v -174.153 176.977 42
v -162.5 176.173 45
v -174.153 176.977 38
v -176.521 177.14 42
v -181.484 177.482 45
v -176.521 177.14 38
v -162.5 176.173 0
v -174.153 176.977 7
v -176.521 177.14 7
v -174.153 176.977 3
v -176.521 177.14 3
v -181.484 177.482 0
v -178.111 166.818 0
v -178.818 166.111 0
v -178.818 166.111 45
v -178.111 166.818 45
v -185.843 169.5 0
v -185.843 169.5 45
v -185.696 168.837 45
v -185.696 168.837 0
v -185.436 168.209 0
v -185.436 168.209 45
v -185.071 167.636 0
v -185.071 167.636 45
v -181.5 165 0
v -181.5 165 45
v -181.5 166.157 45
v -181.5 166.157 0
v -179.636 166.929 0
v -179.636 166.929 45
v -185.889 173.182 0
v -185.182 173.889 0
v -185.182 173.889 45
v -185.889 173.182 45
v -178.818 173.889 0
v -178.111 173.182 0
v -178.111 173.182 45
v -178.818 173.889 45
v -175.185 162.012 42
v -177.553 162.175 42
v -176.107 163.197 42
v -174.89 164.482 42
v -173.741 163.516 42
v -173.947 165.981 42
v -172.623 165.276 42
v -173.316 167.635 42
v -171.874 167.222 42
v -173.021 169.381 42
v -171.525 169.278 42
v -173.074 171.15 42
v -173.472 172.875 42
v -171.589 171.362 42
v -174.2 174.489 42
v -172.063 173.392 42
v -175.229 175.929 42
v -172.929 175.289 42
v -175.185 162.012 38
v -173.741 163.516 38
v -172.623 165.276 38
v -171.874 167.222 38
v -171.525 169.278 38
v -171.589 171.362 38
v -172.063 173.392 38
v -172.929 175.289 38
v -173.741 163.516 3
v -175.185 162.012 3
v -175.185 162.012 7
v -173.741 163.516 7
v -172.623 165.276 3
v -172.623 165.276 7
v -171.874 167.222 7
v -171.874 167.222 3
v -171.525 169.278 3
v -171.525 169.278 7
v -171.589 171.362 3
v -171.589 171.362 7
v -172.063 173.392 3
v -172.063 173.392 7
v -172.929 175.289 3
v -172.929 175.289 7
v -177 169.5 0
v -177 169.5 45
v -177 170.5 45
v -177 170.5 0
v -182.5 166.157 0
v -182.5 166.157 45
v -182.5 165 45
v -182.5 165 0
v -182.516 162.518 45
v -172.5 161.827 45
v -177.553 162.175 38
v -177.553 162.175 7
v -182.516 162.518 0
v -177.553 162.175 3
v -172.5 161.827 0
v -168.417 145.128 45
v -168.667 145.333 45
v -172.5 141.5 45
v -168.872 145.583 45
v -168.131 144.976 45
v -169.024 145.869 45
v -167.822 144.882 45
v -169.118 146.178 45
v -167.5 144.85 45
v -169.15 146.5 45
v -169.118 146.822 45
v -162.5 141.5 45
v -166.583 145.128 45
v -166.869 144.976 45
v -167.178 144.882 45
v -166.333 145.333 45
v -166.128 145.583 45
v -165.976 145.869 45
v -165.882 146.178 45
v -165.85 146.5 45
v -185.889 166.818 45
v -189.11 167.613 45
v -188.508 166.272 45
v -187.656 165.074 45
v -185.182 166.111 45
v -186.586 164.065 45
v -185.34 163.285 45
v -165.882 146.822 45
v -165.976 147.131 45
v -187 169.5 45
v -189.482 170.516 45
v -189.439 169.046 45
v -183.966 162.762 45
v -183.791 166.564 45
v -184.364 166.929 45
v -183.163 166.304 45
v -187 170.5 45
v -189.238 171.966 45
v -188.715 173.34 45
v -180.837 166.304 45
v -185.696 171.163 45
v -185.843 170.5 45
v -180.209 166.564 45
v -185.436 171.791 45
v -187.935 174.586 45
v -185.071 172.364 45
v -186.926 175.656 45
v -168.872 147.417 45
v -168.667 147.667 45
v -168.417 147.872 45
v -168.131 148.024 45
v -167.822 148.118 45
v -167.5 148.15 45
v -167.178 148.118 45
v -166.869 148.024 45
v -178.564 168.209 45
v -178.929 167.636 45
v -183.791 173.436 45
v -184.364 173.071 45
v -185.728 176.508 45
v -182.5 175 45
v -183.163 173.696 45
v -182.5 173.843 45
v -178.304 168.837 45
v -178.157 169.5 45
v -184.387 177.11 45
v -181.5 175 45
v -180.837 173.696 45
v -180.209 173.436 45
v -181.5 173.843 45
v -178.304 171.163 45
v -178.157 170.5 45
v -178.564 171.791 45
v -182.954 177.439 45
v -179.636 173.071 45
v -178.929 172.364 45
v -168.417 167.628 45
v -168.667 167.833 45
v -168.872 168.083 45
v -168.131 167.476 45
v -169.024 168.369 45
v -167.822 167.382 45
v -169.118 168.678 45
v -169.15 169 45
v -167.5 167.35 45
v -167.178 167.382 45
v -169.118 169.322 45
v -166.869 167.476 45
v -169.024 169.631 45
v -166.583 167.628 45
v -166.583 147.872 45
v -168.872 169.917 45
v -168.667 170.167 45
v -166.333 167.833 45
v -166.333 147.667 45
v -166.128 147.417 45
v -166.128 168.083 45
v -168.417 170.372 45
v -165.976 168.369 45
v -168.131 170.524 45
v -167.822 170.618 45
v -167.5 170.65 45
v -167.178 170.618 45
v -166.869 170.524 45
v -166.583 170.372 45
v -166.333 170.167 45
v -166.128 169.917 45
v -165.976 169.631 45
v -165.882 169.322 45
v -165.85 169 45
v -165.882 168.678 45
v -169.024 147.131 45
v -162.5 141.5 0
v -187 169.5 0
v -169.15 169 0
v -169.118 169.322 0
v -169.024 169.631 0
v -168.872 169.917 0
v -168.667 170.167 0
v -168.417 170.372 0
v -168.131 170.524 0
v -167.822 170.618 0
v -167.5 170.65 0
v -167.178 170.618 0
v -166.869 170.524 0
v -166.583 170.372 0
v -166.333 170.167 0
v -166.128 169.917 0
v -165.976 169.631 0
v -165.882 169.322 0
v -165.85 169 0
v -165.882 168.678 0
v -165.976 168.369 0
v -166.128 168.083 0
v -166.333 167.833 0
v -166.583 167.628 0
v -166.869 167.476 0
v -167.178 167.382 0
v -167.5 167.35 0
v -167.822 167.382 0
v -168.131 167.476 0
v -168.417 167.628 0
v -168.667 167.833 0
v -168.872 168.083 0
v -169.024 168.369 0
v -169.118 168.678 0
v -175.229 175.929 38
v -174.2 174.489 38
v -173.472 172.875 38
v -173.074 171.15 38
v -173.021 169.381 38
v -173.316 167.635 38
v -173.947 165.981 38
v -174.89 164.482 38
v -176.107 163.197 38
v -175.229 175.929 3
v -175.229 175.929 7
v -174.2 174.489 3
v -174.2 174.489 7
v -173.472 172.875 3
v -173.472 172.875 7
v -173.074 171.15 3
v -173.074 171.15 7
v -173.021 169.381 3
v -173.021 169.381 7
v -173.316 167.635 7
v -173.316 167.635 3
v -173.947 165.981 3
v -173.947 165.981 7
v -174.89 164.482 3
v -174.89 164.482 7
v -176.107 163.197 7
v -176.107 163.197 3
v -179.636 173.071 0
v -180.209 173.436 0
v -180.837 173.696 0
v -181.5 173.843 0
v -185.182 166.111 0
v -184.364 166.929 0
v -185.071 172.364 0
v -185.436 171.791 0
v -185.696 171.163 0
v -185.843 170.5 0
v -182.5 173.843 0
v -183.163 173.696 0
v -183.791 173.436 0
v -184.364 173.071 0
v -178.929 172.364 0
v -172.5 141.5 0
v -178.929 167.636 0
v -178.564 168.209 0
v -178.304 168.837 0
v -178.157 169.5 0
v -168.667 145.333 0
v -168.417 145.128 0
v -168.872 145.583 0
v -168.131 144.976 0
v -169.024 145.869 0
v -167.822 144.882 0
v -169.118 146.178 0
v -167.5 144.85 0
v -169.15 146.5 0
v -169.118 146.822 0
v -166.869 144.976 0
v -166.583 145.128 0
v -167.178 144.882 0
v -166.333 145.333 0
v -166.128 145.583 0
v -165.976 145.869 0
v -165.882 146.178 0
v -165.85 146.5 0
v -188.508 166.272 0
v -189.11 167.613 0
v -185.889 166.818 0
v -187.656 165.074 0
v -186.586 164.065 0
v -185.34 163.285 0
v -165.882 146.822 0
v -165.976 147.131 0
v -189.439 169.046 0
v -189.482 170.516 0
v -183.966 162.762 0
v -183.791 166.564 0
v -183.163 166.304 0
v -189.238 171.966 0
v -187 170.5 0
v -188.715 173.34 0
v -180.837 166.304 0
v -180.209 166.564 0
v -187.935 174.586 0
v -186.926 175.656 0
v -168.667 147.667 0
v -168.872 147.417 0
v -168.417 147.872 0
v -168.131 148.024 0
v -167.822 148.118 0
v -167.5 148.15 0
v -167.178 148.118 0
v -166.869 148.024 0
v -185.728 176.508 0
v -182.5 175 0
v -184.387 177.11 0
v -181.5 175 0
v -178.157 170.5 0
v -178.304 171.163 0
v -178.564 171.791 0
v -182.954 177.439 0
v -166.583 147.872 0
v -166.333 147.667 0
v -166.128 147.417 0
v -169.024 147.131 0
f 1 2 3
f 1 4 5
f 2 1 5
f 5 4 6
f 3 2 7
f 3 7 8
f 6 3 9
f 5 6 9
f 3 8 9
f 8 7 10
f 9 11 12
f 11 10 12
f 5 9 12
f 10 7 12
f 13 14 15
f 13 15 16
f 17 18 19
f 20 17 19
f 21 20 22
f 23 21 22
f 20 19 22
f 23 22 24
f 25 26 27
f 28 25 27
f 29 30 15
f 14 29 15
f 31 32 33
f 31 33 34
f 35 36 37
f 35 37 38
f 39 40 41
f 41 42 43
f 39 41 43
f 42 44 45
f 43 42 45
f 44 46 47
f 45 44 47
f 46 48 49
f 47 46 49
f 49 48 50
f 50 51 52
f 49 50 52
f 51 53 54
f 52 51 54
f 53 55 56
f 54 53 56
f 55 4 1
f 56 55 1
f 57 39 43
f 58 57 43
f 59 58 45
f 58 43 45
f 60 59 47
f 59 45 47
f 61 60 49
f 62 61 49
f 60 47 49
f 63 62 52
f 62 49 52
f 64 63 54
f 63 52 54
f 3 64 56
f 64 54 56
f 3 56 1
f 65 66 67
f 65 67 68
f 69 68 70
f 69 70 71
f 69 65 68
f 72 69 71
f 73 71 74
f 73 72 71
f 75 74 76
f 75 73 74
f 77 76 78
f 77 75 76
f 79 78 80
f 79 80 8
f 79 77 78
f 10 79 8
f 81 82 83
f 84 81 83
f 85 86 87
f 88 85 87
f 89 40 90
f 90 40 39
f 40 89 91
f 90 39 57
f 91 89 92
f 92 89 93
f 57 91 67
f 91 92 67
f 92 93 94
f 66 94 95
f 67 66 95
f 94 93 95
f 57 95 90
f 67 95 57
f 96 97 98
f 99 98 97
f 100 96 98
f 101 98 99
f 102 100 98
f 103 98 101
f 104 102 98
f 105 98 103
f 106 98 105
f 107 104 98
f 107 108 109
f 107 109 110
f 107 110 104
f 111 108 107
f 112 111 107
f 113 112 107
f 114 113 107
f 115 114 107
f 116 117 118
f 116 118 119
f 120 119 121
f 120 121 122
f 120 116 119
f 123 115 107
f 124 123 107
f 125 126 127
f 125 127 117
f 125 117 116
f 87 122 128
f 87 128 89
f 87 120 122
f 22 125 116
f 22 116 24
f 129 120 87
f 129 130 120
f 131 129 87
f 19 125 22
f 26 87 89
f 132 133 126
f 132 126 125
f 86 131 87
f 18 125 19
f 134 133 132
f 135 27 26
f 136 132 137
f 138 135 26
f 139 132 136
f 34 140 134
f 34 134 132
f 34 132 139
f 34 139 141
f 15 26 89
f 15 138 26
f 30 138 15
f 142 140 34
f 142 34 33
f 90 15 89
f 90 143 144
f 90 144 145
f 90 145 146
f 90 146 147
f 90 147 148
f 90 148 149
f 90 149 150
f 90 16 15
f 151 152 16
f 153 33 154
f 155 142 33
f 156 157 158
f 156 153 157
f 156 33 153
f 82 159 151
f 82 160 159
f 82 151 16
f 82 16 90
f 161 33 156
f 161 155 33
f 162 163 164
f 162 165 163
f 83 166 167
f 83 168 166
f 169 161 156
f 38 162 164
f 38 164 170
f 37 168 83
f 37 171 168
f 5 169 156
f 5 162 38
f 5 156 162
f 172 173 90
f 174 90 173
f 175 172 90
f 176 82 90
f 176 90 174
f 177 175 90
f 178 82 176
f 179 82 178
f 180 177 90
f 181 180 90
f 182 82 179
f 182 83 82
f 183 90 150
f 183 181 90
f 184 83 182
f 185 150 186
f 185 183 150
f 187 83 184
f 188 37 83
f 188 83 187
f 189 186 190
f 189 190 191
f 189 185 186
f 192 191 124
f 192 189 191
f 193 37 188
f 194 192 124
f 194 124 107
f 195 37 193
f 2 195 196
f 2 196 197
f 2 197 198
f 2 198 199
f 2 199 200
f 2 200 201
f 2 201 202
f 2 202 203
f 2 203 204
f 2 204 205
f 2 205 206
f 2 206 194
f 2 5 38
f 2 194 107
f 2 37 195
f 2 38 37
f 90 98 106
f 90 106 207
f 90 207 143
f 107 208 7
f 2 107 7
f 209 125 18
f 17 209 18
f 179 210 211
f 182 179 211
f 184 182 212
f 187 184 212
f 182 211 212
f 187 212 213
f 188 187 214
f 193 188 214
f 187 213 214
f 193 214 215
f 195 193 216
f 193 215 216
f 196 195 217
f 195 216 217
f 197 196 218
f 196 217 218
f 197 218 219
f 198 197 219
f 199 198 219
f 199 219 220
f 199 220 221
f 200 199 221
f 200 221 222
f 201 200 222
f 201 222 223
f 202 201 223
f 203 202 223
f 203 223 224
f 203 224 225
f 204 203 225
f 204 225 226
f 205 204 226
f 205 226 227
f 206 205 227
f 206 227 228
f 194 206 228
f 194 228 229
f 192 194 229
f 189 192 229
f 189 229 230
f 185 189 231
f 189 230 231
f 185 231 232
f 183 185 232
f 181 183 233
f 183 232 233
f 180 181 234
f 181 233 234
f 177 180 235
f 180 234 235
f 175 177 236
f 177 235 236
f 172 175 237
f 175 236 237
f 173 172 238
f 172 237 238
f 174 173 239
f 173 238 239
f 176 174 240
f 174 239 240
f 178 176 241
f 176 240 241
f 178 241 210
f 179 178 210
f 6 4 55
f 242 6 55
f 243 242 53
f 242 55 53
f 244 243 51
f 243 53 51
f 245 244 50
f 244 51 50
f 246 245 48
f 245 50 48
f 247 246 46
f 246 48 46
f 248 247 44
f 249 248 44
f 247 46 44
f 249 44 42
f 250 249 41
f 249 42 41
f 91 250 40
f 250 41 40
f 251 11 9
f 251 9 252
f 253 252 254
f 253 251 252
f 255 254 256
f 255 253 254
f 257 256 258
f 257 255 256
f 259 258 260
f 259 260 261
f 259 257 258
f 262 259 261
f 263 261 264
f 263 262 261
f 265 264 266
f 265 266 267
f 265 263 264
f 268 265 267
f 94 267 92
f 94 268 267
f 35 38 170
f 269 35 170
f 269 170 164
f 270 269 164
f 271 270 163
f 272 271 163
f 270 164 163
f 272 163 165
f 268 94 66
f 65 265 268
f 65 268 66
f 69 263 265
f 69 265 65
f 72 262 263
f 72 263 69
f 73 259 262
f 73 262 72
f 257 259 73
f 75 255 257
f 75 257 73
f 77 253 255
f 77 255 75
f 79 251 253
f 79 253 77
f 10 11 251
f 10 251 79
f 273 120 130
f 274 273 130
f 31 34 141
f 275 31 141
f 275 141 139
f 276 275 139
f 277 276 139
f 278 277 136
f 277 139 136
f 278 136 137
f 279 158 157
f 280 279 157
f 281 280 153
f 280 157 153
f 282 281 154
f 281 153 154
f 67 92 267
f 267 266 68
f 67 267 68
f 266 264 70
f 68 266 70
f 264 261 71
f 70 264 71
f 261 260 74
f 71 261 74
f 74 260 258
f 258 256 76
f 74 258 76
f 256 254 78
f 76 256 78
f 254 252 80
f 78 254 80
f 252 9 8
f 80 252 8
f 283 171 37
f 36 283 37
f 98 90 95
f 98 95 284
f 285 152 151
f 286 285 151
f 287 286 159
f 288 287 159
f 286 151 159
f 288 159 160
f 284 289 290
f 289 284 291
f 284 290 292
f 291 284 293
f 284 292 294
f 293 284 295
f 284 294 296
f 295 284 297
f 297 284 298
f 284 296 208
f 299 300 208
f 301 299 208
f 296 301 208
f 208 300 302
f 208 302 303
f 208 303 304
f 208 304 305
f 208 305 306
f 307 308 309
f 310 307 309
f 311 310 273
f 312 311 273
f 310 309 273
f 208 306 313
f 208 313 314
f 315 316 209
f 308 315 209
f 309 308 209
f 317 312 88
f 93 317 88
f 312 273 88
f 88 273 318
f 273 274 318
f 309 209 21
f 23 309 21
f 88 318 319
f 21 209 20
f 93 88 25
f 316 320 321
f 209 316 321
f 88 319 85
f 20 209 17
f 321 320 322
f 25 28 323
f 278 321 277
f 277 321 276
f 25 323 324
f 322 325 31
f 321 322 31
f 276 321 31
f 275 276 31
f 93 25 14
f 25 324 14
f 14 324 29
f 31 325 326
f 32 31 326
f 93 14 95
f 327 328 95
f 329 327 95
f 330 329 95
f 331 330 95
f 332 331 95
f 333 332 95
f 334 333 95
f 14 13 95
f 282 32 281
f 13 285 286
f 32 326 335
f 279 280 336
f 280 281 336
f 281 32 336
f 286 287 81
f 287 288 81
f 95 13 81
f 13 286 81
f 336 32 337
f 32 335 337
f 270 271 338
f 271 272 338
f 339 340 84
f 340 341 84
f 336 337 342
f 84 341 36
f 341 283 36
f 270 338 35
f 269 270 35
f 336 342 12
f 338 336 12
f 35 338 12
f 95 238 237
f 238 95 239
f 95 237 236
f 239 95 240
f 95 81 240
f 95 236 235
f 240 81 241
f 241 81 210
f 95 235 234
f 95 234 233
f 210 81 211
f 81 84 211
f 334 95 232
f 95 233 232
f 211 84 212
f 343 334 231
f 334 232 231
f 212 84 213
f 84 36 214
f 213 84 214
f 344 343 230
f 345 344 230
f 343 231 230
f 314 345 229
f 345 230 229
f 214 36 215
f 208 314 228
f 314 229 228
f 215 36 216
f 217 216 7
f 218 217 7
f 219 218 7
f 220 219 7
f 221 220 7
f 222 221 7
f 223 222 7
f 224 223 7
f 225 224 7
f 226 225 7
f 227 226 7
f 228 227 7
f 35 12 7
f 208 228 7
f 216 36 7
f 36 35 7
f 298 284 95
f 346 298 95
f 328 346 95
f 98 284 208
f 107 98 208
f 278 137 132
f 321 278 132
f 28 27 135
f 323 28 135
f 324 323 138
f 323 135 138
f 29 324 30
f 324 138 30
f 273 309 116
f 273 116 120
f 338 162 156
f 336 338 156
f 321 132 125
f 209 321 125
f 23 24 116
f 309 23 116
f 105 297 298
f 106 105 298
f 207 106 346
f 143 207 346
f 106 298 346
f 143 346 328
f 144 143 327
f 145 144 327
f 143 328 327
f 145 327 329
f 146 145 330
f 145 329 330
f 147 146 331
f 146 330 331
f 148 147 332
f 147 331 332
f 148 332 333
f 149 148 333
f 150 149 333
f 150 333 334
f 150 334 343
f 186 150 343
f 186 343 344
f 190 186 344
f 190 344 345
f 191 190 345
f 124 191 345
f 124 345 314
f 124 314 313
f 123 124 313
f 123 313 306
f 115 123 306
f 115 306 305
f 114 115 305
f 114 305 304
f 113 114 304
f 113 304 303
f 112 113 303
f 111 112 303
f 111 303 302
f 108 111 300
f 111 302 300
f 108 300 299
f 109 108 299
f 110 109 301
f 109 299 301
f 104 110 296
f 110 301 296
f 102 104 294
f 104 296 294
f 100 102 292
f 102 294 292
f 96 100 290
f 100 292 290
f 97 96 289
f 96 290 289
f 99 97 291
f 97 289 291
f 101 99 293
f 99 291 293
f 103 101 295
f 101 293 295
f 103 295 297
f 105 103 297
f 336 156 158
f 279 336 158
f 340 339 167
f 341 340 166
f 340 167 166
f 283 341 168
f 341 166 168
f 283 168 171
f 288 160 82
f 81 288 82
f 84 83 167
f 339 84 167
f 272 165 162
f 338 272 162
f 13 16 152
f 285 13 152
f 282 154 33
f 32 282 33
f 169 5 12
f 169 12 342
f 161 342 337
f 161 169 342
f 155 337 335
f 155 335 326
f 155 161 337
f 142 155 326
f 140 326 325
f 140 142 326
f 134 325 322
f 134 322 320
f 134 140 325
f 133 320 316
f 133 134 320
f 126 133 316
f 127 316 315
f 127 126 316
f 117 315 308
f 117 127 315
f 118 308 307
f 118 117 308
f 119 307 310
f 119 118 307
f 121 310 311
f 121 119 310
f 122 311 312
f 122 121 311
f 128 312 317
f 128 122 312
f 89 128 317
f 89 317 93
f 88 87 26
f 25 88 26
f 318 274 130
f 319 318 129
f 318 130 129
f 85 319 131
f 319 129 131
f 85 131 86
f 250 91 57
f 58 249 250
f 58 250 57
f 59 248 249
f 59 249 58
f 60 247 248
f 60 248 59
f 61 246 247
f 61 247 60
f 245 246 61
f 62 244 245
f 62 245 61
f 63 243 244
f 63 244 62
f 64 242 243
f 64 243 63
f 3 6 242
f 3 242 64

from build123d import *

# Parameters (mm, degrees)
BOSS_EXTRUDE1_DEPTH   = 45
CUT_EXTRUDE1_START    = -5
CUT_EXTRUDE1_DEPTH    = 2
M4X0_7_TAPPED_HOLE1_D = 3.3
SKETCH5_R             = 7.5
BOSS_EXTRUDE2_DEPTH   = 45
SKETCH6_R             = 3.875
CUT_EXTRUDE2_DEPTH    = 46
CUT_EXTRUDE4_DEPTH    = 46


with BuildPart() as part:
    # Sketch1 → Boss-Extrude1 (new body)
    with BuildSketch(Plane.XY):
        with BuildLine():
            Line((-182.516015687, 162.517772537), (-172.5, 161.827012834))
            Line((-172.5, 161.827012834), (-172.5, 141.5))
            Line((-172.5, 141.5), (-162.5, 141.5))
            Line((-162.5, 141.5), (-162.5, 176.172987166))
            Line((-162.5, 176.172987166), (-181.483984313, 177.482227463))
            ThreePointArc((-181.483984313, 177.482227463), (-174.517772537, 169.483984313), (-182.516015687, 162.517772537))
        make_face()
    extrude(amount=BOSS_EXTRUDE1_DEPTH)

    # Sketch2 → Cut-Extrude1 (cut, symmetric)
    with BuildSketch(Plane(origin=(0, 0, 0), x_dir=(-1, 0, 0), z_dir=(0, 0, -1)).offset(CUT_EXTRUDE1_START)):
        with BuildLine():
            ThreePointArc((176.520836095, 177.139941379), (173.021327044, 169.380781175), (177.552867469, 162.175486453))
            ThreePointArc((177.552867469, 162.175486453), (177.834315887, 161.15284928), (176.811678714, 160.871400862))
            ThreePointArc((176.811678714, 160.871400862), (171.524881552, 169.277578038), (175.60764211, 178.329931609))
            ThreePointArc((175.60764211, 178.329931609), (176.659234217, 178.191533486), (176.520836095, 177.139941379))
        make_face()
    cut_extrude1 = extrude(amount=CUT_EXTRUDE1_DEPTH, both=True, mode=Mode.SUBTRACT)

    # Mirror1: Cut-Extrude1 across plane
    add(cut_extrude1.mirror(Plane(origin=(0, 0, 22.5), x_dir=(1, 0, 0), z_dir=(0, 0, -1))), mode=Mode.SUBTRACT)

    # M4x0.7 Tapped Hole1 (through all)
    with Locations(Plane.XY.offset(45)):
        with Locations((-167.5, 169), (-167.5, 146.5)):
            Hole(M4X0_7_TAPPED_HOLE1_D / 2)

    # Sketch5 → Boss-Extrude2 (add, through all)
    with BuildSketch(Plane.XY.offset(45)):
        with Locations((-182, 170)):
            Circle(SKETCH5_R)
    extrude(amount=-BOSS_EXTRUDE2_DEPTH)

    # Sketch6 → Cut-Extrude2 (cut, through all)
    with BuildSketch(Plane.XY.offset(45)):
        with Locations((-182, 170)):
            Circle(SKETCH6_R)
    extrude(amount=-CUT_EXTRUDE2_DEPTH, mode=Mode.SUBTRACT)

    # Sketch8 → Cut-Extrude4 (cut, through all)
    with BuildSketch(Plane.XY.offset(45)):
        with BuildLine():
            ThreePointArc((-178.929313469, 167.636420251), (-179.259961223, 167.259961223), (-179.636420251, 166.929313469))
            Line((-179.636420251, 166.929313469), (-178.818019485, 166.110912703))
            Line((-178.818019485, 166.110912703), (-178.110912703, 166.818019485))
            Line((-178.110912703, 166.818019485), (-178.929313469, 167.636420251))
        make_face()
        with BuildLine():
            Line((-182.5, 166.157393463), (-182.5, 165))
            Line((-182.5, 165), (-181.5, 165))
            Line((-181.5, 165), (-181.5, 166.157393463))
            ThreePointArc((-181.5, 166.157393463), (-182, 166.125), (-182.5, 166.157393463))
        make_face()
        with BuildLine():
            Line((-185.181980515, 166.110912703), (-184.363579749, 166.929313469))
            ThreePointArc((-184.363579749, 166.929313469), (-184.740038777, 167.259961223), (-185.070686531, 167.636420251))
            Line((-185.070686531, 167.636420251), (-185.889087297, 166.818019485))
            Line((-185.889087297, 166.818019485), (-185.181980515, 166.110912703))
        make_face()
        with BuildLine():
            Line((-187, 169.5), (-185.842606537, 169.5))
            ThreePointArc((-185.842606537, 169.5), (-185.875, 170), (-185.842606537, 170.5))
            Line((-185.842606537, 170.5), (-187, 170.5))
            Line((-187, 170.5), (-187, 169.5))
        make_face()
        with BuildLine():
            Line((-185.889087297, 173.181980515), (-185.070686531, 172.363579749))
            ThreePointArc((-185.070686531, 172.363579749), (-184.740038777, 172.740038777), (-184.363579749, 173.070686531))
            Line((-184.363579749, 173.070686531), (-185.181980515, 173.889087297))
            Line((-185.181980515, 173.889087297), (-185.889087297, 173.181980515))
        make_face()
        with BuildLine():
            Line((-182.5, 175), (-182.5, 173.842606537))
            ThreePointArc((-182.5, 173.842606537), (-182, 173.875), (-181.5, 173.842606537))
            Line((-181.5, 173.842606537), (-181.5, 175))
            Line((-181.5, 175), (-182.5, 175))
        make_face()
        with BuildLine():
            ThreePointArc((-179.636420251, 173.070686531), (-179.259961223, 172.740038777), (-178.929313469, 172.363579749))
            Line((-178.929313469, 172.363579749), (-178.110912703, 173.181980515))
            Line((-178.110912703, 173.181980515), (-178.818019485, 173.889087297))
            Line((-178.818019485, 173.889087297), (-179.636420251, 173.070686531))
        make_face()
        with BuildLine():
            ThreePointArc((-178.125, 170), (-178.133106846, 169.749475881), (-178.157393463, 169.5))
            Line((-178.157393463, 169.5), (-177, 169.5))
            Line((-177, 169.5), (-177, 170.5))
            Line((-177, 170.5), (-178.157393463, 170.5))
            ThreePointArc((-178.157393463, 170.5), (-178.133106846, 170.250524119), (-178.125, 170))
        make_face()
    extrude(amount=-CUT_EXTRUDE4_DEPTH, mode=Mode.SUBTRACT)


solid = part.part
